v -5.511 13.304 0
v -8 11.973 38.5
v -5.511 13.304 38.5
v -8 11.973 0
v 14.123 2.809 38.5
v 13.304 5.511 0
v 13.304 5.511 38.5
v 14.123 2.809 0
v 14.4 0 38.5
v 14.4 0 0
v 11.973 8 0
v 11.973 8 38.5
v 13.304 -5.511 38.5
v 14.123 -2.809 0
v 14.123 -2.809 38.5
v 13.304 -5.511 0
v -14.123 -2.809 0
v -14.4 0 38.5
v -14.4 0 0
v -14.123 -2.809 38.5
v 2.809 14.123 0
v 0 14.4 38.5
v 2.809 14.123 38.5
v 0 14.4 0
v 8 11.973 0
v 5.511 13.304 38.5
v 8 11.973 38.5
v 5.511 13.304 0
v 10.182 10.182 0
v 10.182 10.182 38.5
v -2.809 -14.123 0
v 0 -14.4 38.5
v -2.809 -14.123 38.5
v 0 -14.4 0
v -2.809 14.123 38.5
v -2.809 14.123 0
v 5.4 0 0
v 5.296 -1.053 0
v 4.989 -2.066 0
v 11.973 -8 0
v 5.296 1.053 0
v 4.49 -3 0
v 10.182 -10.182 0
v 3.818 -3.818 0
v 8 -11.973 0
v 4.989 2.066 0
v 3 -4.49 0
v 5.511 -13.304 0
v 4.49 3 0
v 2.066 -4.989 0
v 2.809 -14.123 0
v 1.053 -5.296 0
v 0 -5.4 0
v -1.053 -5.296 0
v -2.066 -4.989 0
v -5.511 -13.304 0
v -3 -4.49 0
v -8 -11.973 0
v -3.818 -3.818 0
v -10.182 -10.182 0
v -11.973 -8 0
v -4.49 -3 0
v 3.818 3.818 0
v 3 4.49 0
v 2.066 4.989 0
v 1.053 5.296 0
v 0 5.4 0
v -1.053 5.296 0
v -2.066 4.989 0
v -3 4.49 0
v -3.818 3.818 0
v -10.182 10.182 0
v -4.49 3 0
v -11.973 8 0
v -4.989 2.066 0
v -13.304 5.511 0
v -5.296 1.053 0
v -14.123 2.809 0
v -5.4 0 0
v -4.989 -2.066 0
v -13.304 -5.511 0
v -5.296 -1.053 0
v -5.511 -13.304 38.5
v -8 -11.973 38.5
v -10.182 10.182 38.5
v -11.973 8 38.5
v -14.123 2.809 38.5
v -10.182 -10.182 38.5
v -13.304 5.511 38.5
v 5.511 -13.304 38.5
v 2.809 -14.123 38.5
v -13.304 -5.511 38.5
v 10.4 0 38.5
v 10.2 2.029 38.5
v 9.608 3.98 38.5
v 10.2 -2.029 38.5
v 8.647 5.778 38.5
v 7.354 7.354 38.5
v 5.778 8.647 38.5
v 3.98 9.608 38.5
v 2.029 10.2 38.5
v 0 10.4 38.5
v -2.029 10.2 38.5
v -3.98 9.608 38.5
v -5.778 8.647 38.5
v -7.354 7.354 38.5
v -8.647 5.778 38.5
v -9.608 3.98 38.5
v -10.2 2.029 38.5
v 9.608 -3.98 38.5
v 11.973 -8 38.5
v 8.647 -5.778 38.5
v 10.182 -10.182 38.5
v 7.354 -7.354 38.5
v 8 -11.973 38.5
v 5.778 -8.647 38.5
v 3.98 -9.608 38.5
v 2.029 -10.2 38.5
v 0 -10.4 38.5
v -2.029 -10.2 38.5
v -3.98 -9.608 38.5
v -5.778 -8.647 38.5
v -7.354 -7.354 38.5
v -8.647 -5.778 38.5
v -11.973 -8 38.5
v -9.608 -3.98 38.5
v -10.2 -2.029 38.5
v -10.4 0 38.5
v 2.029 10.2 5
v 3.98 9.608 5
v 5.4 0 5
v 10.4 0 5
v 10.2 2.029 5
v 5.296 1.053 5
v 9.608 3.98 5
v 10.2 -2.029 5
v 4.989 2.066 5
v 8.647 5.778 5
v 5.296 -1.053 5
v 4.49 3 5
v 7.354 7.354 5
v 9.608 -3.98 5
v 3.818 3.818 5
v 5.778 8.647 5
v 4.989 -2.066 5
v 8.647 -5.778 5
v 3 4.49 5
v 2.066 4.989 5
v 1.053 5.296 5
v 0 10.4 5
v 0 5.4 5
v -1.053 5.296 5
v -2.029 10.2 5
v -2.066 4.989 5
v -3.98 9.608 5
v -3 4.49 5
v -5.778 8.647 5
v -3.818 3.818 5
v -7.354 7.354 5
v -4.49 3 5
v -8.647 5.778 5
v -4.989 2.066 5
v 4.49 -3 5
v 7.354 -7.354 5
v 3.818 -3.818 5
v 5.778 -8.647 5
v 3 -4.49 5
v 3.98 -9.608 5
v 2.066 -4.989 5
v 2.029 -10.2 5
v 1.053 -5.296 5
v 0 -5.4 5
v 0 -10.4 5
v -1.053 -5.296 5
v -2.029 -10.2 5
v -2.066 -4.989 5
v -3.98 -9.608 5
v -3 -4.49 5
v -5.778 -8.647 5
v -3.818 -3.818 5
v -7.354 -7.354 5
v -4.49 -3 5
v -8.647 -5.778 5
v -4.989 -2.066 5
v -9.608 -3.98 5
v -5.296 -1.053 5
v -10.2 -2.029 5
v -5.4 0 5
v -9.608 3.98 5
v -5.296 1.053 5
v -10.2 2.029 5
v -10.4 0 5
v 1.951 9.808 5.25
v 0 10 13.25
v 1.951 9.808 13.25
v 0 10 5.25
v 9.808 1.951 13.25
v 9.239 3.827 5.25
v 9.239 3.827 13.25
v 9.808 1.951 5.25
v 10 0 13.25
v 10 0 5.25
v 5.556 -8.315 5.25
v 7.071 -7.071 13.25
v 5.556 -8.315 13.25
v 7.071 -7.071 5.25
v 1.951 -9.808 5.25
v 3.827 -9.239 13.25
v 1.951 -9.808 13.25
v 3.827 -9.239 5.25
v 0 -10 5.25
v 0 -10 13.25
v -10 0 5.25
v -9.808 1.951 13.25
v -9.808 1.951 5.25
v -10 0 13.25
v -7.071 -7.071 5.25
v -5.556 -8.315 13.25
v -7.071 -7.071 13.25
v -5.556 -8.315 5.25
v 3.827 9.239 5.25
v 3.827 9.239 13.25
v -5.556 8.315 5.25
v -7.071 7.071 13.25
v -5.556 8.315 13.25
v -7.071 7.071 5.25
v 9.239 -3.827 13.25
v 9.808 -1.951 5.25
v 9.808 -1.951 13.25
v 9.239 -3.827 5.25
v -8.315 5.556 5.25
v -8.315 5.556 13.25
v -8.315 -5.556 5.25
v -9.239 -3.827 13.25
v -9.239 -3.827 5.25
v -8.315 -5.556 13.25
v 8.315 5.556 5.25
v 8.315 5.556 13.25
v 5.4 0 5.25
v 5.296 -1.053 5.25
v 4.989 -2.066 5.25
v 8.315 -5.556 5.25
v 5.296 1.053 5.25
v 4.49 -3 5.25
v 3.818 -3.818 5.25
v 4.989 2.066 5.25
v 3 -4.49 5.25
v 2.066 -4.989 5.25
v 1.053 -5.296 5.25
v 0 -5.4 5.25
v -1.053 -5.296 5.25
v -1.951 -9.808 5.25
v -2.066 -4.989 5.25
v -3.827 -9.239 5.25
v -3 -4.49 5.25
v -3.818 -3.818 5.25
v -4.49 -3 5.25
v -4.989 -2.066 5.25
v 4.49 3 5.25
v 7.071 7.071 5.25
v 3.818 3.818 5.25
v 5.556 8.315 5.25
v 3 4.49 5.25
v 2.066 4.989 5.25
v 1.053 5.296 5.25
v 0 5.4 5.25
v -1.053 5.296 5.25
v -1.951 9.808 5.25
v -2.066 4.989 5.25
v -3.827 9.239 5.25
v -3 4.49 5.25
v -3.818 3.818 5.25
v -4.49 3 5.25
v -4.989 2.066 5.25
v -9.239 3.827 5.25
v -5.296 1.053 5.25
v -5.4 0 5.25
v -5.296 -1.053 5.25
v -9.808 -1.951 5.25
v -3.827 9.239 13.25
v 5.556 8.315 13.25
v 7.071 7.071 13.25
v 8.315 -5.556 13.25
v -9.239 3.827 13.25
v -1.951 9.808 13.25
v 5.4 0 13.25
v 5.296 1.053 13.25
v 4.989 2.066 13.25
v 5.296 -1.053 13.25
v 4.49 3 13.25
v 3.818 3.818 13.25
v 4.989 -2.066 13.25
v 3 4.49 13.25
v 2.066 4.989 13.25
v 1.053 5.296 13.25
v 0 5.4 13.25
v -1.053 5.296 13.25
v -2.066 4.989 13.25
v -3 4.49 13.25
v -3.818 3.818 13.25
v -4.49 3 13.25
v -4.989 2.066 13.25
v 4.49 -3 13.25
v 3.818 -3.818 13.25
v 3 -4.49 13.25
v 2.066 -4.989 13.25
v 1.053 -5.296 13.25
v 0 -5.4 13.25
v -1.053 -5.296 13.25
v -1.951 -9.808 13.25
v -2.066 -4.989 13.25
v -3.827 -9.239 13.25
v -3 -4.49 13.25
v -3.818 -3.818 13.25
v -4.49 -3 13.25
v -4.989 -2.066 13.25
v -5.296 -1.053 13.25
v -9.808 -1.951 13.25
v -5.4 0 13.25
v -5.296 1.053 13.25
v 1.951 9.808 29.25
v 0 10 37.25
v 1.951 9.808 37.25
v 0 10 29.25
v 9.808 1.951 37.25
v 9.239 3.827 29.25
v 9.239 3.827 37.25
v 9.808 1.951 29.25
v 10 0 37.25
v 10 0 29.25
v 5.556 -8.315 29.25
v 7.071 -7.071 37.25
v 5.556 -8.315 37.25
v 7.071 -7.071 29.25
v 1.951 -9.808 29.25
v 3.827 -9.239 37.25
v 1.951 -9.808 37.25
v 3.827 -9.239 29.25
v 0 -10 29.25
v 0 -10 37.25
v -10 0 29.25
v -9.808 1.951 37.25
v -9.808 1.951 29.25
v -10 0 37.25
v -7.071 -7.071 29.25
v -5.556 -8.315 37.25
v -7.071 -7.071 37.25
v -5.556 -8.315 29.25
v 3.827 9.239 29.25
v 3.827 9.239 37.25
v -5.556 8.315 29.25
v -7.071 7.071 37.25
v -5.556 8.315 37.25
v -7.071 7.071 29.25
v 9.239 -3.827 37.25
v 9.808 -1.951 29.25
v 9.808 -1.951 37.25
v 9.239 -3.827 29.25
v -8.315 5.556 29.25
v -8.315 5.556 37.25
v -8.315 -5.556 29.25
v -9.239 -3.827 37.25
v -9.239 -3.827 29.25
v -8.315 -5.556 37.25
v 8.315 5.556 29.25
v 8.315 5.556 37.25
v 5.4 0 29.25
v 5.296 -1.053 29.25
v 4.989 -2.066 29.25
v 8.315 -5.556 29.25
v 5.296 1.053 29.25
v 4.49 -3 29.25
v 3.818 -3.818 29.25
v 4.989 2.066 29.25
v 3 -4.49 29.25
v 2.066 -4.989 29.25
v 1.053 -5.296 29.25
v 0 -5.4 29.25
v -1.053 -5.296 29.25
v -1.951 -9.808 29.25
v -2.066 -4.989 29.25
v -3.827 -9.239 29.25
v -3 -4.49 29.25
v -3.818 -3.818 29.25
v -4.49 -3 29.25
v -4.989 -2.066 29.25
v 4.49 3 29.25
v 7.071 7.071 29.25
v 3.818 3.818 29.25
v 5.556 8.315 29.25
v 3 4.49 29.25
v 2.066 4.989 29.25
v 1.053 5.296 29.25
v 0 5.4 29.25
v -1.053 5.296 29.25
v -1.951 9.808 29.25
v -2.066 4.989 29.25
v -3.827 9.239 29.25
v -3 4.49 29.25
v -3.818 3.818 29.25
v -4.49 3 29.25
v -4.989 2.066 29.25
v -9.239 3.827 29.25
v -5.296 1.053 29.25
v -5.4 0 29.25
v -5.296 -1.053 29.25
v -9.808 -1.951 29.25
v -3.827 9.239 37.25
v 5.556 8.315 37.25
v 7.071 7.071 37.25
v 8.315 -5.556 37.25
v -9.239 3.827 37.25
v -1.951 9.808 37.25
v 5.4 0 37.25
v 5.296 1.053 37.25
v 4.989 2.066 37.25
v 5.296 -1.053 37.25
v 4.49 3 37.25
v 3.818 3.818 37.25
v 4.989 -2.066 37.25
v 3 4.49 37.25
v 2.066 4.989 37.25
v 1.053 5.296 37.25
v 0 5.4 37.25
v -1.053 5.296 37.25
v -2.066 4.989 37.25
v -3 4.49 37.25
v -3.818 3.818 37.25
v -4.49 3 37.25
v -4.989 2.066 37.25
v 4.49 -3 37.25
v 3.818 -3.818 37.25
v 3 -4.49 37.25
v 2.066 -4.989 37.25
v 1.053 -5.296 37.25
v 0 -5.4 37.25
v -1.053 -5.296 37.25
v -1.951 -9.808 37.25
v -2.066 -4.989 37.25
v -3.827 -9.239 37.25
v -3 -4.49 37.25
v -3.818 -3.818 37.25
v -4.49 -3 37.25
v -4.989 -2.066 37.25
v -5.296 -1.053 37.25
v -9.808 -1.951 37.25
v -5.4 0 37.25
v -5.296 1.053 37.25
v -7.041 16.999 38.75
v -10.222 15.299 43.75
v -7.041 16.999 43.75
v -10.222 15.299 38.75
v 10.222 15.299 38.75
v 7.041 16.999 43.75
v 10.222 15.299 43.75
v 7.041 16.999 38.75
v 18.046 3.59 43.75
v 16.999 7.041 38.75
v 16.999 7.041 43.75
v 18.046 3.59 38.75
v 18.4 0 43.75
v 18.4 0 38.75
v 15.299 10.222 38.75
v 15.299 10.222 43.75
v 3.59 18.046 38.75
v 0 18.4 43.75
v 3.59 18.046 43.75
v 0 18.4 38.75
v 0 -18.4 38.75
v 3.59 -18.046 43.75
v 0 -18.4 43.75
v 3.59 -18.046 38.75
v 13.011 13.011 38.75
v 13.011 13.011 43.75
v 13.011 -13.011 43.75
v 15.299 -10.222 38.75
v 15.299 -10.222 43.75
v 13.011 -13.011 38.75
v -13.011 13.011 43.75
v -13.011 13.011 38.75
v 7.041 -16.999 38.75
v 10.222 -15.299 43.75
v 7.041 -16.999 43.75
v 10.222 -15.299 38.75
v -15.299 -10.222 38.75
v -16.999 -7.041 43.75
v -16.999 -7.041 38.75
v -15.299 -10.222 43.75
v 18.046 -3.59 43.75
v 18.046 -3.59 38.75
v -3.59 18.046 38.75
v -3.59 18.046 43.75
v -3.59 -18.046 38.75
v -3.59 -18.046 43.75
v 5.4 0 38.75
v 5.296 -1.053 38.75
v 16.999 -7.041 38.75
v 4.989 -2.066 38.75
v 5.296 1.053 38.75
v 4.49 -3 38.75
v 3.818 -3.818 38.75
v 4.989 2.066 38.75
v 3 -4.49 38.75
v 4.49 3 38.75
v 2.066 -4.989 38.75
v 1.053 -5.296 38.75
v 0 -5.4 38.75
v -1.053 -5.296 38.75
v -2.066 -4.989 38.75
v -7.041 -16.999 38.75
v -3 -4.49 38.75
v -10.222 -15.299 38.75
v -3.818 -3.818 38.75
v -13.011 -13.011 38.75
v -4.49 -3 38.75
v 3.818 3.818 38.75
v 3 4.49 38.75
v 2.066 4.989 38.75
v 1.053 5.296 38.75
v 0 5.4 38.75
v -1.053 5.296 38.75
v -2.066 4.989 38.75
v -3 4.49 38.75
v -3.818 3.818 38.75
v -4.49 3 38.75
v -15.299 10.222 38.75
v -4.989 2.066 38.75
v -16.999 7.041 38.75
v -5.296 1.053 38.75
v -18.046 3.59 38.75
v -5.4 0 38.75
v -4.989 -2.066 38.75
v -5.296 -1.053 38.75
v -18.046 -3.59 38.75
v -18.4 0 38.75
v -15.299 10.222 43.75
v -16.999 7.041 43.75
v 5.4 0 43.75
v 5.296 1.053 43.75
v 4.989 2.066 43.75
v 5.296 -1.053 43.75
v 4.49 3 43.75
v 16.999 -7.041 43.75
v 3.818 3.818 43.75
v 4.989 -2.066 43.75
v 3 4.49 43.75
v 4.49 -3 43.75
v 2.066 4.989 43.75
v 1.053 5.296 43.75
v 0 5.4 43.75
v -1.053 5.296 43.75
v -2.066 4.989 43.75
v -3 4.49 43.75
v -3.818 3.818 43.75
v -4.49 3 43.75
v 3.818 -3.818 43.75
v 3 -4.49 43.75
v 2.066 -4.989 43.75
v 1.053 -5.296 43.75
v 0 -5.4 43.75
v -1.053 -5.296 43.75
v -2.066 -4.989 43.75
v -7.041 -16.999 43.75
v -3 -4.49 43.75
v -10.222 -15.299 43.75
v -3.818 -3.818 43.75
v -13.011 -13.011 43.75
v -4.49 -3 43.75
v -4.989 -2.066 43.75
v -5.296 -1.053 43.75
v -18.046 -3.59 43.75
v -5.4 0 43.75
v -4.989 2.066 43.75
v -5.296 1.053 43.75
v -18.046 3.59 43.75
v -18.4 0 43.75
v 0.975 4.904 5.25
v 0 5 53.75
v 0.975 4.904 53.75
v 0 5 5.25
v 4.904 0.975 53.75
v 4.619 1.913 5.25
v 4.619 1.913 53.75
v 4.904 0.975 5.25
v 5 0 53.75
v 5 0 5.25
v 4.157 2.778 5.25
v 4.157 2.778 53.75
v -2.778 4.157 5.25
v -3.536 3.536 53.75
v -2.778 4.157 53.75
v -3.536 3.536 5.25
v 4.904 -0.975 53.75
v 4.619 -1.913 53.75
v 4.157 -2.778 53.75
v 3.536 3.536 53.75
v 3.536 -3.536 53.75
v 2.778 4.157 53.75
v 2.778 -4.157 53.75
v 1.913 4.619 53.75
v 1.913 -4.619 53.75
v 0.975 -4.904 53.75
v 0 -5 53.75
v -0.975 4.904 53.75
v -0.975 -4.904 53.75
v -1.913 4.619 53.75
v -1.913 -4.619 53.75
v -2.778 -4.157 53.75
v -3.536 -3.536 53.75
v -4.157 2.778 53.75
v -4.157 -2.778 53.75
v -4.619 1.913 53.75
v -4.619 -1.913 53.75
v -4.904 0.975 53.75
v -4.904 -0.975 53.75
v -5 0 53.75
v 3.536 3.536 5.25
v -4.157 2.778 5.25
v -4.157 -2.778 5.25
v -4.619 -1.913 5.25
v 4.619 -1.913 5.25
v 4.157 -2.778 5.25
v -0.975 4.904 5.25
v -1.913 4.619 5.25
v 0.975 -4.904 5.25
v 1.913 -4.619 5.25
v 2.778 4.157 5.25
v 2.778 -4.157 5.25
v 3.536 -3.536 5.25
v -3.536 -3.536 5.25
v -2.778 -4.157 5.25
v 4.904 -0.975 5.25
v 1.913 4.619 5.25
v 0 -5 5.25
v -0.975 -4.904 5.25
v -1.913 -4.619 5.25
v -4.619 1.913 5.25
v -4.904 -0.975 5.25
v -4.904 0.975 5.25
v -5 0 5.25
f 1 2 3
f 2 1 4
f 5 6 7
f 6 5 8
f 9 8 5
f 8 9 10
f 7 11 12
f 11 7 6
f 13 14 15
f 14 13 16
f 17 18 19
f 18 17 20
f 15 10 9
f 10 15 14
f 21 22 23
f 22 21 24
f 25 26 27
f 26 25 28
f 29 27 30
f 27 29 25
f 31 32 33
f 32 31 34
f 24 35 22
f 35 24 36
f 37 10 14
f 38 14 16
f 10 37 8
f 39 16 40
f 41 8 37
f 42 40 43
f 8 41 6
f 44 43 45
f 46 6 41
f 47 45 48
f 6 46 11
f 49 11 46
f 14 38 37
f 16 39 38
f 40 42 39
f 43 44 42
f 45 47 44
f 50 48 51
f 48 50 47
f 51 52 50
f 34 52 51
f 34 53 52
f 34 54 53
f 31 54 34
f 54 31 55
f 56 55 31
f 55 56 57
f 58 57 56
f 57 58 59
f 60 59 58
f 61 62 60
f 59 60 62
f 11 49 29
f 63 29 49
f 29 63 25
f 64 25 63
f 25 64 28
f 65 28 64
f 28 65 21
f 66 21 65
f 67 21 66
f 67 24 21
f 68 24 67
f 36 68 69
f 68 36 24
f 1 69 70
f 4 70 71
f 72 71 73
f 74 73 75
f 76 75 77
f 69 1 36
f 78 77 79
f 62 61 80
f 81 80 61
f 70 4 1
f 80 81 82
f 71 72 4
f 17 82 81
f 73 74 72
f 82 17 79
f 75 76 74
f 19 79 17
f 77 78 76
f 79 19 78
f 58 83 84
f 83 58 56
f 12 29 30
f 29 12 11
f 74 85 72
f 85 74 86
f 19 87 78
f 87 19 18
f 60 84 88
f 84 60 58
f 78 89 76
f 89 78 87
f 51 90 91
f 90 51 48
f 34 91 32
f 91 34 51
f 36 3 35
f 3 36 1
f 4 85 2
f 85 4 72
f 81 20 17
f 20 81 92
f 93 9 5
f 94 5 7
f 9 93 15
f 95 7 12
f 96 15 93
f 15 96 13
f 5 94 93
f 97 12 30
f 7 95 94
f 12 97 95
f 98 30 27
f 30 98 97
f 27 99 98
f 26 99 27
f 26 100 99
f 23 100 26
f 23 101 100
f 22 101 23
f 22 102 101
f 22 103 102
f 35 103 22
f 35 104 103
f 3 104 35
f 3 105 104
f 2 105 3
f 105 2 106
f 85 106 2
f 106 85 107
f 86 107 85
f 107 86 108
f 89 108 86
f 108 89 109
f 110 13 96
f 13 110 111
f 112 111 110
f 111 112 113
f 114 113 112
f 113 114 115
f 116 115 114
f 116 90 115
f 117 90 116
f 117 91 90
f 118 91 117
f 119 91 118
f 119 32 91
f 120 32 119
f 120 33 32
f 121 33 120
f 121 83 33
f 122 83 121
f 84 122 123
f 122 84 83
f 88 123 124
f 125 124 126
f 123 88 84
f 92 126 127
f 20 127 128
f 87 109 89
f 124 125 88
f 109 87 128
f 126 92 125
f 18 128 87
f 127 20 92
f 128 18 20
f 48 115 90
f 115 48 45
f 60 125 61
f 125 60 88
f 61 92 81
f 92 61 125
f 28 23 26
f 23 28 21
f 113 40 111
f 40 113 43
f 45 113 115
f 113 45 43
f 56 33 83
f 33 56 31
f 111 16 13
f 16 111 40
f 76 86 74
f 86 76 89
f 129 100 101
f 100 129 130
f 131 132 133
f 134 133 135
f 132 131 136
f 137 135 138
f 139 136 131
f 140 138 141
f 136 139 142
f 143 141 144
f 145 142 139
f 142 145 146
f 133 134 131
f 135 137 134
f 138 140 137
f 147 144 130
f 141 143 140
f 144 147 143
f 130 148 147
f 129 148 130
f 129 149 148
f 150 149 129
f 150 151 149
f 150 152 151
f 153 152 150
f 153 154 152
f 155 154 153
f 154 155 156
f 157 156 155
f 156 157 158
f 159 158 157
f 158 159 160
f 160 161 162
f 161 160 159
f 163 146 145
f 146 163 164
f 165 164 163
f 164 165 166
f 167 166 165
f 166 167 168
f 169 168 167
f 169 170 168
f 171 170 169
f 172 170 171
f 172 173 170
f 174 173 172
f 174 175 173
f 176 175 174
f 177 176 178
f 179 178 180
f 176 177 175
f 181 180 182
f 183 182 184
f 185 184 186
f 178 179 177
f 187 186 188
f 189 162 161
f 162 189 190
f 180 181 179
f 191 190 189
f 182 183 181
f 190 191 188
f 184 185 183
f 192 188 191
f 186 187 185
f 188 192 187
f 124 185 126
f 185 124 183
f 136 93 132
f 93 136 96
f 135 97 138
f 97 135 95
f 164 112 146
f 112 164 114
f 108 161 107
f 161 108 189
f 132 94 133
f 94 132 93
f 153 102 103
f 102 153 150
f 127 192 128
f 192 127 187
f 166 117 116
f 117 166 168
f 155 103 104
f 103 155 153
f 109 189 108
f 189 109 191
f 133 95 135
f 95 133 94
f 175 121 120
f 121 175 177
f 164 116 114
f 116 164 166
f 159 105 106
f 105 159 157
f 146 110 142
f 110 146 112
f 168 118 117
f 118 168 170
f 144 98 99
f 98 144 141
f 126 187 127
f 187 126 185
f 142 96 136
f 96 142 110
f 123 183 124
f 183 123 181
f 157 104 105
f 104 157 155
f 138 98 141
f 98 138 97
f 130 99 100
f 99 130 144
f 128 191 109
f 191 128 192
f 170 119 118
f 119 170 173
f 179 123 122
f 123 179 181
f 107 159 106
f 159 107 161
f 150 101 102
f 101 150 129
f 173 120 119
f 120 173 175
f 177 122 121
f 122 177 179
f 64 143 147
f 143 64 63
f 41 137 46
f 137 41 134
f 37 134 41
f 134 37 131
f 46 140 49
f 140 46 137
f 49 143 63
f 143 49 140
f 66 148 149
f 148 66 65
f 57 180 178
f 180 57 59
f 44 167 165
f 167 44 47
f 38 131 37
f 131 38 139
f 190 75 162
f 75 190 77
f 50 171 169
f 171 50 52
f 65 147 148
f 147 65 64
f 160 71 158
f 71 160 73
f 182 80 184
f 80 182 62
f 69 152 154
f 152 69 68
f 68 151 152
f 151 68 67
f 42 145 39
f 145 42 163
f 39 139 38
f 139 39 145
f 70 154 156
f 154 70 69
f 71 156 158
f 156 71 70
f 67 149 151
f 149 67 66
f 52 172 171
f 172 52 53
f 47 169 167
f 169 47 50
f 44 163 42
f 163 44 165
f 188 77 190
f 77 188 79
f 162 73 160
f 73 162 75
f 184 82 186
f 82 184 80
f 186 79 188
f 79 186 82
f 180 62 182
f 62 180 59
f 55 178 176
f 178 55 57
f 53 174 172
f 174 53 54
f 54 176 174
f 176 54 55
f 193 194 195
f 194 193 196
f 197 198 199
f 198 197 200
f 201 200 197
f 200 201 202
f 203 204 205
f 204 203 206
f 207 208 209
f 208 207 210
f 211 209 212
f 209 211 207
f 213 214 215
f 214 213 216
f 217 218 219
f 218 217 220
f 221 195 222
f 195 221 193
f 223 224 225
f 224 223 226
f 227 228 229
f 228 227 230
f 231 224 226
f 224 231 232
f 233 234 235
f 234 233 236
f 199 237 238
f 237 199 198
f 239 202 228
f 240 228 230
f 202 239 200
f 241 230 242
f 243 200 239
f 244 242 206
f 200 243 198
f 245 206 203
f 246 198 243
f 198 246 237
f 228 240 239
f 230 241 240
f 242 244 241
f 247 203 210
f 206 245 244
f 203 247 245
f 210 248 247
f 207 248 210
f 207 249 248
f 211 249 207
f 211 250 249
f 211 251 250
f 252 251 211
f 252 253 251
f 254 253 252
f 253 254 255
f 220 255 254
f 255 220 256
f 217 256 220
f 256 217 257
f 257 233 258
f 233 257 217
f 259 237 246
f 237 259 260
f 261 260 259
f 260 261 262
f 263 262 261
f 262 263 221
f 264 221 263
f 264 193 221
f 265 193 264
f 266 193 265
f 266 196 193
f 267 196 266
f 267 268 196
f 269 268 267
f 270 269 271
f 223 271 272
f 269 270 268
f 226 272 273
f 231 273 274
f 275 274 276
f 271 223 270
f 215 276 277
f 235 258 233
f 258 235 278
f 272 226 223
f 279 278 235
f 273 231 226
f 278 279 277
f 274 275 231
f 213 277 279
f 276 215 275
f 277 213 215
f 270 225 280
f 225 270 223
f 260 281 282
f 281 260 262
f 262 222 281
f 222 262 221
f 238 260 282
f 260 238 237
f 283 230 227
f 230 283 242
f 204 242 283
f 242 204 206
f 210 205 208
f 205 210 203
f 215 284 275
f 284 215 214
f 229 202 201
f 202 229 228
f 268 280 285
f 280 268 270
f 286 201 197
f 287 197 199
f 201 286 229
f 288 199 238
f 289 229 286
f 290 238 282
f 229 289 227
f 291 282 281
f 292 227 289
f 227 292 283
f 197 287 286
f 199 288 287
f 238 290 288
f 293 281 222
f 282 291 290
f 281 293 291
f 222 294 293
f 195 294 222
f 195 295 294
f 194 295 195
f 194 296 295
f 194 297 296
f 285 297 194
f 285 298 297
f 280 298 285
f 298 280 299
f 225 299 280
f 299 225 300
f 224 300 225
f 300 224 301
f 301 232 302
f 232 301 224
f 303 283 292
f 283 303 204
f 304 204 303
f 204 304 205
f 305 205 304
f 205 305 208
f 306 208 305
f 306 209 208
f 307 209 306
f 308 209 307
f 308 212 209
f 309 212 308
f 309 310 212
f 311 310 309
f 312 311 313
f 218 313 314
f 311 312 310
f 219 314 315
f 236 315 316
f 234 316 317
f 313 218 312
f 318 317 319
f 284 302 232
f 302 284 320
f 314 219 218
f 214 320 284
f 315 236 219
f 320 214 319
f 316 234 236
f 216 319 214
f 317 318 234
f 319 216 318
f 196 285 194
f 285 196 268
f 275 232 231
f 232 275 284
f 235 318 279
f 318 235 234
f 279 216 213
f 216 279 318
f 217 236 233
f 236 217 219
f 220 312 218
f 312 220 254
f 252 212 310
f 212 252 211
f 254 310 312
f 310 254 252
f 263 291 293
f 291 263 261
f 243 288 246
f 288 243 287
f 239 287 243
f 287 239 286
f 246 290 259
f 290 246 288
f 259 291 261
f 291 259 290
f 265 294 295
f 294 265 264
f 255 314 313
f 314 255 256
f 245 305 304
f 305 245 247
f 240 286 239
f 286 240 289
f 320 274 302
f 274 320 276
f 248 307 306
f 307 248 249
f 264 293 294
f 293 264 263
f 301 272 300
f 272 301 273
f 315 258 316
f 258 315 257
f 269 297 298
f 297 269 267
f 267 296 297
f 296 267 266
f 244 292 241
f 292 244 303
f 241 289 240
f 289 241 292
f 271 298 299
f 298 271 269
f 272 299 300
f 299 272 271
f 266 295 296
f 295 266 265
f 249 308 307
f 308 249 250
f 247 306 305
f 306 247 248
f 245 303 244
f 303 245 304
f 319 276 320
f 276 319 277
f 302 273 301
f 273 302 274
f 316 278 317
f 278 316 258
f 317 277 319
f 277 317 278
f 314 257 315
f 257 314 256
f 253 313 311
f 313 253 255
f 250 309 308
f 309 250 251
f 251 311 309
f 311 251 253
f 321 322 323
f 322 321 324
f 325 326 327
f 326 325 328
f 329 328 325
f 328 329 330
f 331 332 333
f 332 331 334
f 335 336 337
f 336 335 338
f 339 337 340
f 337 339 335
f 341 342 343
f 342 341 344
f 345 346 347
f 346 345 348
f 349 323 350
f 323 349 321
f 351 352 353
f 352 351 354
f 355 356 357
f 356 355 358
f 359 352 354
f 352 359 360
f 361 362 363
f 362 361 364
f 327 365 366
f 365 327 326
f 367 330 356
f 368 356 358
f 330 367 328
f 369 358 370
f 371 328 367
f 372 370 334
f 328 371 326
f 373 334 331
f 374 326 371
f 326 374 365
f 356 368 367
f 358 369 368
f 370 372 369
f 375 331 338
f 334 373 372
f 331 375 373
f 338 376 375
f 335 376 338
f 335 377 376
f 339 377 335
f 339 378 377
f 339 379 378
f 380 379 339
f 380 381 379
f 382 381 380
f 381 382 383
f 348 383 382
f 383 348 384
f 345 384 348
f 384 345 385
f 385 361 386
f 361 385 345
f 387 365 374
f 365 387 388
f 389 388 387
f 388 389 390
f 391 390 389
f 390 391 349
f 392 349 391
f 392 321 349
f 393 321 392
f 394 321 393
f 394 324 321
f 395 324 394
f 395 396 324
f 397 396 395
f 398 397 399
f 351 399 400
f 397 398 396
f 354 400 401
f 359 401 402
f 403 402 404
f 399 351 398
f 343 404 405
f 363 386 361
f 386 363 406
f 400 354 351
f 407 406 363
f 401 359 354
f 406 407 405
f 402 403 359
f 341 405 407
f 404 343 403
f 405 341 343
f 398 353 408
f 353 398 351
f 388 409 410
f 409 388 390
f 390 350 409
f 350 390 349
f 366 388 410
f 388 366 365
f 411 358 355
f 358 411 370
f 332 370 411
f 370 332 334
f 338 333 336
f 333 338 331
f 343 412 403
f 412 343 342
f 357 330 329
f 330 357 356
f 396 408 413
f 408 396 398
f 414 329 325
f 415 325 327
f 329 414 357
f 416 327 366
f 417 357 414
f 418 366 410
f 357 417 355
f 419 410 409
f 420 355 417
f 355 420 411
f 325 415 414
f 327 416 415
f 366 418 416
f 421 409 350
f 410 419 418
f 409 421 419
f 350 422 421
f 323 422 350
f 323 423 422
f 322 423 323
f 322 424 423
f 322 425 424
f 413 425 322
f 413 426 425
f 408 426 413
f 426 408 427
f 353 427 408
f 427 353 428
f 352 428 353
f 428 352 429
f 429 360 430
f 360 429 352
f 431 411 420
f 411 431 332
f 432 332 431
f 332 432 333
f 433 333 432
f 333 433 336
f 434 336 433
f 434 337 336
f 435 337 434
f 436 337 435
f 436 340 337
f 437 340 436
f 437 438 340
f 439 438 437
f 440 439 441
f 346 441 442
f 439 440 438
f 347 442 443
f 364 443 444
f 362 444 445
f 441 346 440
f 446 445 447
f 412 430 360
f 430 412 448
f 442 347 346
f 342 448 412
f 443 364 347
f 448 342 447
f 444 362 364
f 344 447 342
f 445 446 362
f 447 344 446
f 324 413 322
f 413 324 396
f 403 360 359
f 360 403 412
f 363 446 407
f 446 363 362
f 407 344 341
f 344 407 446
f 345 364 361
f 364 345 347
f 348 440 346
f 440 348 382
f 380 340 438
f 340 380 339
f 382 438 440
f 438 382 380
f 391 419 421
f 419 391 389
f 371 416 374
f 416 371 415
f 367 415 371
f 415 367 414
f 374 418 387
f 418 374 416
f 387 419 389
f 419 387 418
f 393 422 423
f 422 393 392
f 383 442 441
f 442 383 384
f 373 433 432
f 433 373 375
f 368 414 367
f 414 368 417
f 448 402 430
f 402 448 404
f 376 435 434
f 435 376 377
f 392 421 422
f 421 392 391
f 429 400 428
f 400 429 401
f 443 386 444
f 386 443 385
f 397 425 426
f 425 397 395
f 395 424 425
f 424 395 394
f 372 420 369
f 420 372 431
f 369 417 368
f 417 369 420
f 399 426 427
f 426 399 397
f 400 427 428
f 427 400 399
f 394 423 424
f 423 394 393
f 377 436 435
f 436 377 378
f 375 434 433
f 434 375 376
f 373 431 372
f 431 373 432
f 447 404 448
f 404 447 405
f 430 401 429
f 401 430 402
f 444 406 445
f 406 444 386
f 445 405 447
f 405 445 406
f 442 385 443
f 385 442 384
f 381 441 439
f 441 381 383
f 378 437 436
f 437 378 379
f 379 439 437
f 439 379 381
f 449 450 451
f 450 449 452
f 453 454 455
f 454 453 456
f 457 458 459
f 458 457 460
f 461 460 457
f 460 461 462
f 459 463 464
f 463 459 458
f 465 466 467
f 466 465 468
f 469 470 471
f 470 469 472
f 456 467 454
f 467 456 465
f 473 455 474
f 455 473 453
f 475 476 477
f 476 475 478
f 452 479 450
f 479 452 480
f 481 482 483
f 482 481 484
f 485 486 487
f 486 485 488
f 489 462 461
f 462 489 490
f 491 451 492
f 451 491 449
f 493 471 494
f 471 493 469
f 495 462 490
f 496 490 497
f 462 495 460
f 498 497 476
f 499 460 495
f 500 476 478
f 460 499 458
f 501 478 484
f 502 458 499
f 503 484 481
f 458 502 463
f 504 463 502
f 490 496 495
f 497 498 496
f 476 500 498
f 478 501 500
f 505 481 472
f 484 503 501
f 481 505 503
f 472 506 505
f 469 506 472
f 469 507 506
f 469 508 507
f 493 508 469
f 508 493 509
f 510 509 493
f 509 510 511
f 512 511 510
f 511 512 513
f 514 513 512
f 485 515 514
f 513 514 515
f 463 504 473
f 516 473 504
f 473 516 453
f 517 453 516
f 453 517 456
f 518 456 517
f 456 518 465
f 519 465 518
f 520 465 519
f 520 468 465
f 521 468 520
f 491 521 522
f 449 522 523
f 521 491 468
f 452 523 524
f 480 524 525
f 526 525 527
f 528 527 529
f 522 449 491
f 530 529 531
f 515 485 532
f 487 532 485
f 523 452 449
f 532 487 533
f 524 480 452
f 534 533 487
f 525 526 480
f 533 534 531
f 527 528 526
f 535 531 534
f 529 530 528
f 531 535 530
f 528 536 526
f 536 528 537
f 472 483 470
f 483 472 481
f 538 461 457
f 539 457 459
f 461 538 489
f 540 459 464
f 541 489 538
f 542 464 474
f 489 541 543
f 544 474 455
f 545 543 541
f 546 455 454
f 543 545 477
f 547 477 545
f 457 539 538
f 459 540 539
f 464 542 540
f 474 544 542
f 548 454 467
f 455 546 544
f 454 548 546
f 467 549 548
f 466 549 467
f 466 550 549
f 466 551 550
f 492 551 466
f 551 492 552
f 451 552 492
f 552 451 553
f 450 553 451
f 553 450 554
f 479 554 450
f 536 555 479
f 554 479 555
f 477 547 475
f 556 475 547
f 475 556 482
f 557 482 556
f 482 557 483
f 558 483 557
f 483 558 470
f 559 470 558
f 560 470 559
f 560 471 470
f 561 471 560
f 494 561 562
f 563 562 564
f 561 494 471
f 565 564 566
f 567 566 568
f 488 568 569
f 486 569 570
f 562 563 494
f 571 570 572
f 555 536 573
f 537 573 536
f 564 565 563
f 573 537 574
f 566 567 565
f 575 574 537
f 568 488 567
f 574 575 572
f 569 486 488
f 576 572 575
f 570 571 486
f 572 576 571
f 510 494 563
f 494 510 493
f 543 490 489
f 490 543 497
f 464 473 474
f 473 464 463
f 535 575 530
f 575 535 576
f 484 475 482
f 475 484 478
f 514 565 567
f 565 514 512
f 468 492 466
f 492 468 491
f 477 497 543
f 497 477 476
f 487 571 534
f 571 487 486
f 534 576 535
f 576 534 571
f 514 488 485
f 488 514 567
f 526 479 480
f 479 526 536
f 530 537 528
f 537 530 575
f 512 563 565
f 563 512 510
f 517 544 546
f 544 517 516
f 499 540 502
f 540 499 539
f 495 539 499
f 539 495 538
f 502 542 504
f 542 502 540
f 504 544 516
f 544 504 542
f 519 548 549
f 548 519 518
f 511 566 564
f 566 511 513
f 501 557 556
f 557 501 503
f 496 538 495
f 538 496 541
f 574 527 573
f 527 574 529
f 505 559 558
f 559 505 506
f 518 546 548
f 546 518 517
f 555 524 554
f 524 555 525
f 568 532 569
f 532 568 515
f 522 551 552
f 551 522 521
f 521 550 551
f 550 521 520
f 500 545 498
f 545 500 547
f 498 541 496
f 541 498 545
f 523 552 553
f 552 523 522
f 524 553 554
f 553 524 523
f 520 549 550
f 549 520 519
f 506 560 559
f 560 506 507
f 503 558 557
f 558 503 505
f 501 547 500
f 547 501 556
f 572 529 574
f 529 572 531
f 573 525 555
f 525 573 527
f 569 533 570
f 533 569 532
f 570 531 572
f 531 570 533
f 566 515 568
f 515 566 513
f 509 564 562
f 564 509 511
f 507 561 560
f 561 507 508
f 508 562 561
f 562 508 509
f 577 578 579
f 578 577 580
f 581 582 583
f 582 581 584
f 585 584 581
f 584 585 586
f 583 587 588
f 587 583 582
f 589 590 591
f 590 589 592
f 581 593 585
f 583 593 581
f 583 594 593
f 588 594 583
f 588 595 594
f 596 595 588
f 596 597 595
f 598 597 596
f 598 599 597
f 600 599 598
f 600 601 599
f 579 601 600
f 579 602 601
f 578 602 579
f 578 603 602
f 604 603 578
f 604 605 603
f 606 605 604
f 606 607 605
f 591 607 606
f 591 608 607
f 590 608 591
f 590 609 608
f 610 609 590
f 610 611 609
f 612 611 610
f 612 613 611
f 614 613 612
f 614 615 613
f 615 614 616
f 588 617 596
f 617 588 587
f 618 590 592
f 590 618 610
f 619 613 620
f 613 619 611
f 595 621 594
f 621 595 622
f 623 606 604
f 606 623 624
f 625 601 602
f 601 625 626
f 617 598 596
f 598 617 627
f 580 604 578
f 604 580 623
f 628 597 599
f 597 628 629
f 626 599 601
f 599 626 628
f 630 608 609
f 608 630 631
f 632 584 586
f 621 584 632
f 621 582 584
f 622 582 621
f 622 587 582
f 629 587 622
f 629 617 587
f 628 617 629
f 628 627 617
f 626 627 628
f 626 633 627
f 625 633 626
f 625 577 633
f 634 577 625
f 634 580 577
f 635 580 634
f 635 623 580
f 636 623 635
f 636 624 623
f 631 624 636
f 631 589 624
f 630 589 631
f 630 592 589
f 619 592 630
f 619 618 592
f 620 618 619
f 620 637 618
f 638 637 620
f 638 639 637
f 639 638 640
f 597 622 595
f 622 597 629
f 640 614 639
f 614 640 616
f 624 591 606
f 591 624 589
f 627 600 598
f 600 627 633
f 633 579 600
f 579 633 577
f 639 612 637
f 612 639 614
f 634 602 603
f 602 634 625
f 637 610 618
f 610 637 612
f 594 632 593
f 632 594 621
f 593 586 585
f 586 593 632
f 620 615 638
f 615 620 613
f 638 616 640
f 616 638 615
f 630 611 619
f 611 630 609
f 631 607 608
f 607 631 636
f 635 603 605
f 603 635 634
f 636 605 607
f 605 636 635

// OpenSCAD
$fn = 32;

// ------------------------------------------------------------------------
// Shaft station: cup d28.8 x 38.5 mm, shaft d10
// Every part is its own module, assembly() places every instance.
// ------------------------------------------------------------------------

// --- part 1 ---
module housing_cup() {
  difference() {
    cylinder(h = 38.5, d = 28.8);
    translate([0, 0, 5]) cylinder(h = 34.5, d = 20.8);
    translate([0, 0, -1]) cylinder(h = 7, d = 10.8);
  }
}

// --- part 2 ---
module bearing_lower() {
  difference() {
      translate([0, 0, 0]) cylinder(h = 8, d = 20);
      translate([0, 0, -1]) cylinder(h = 10, d = 10.8);
    }
}

// --- part 3 ---
module bearing_upper() {
  difference() {
      translate([0, 0, 0]) cylinder(h = 8, d = 20);
      translate([0, 0, -1]) cylinder(h = 10, d = 10.8);
    }
}

// --- part 4 ---
module station_shaft() {
  translate([0, 0, -24.25]) cylinder(h = 48.5, d = 10);
}

// --- part 5 ---
module station_cover() {
  difference() {
    cylinder(h = 5, d = 36.8);
    translate([0, 0, -1]) cylinder(h = 7, d = 10.8);
  }
}

// --- assembly ---
module assembly() {
  color([0.80, 0.24, 0.20]) translate([0, 0, 0]) rotate([0, 0, 0]) housing_cup();
  color([0.20, 0.45, 0.75]) translate([0, 0, 5.25]) rotate([0, 0, 0]) bearing_lower();
  color([0.25, 0.62, 0.32]) translate([0, 0, 29.25]) rotate([0, 0, 0]) bearing_upper();
  color([0.92, 0.70, 0.18]) translate([0, 0, 29.5]) rotate([0, 0, 0]) station_shaft();
  color([0.58, 0.35, 0.70]) translate([0, 0, 38.75]) rotate([0, 0, 0]) station_cover();
}

assembly();
